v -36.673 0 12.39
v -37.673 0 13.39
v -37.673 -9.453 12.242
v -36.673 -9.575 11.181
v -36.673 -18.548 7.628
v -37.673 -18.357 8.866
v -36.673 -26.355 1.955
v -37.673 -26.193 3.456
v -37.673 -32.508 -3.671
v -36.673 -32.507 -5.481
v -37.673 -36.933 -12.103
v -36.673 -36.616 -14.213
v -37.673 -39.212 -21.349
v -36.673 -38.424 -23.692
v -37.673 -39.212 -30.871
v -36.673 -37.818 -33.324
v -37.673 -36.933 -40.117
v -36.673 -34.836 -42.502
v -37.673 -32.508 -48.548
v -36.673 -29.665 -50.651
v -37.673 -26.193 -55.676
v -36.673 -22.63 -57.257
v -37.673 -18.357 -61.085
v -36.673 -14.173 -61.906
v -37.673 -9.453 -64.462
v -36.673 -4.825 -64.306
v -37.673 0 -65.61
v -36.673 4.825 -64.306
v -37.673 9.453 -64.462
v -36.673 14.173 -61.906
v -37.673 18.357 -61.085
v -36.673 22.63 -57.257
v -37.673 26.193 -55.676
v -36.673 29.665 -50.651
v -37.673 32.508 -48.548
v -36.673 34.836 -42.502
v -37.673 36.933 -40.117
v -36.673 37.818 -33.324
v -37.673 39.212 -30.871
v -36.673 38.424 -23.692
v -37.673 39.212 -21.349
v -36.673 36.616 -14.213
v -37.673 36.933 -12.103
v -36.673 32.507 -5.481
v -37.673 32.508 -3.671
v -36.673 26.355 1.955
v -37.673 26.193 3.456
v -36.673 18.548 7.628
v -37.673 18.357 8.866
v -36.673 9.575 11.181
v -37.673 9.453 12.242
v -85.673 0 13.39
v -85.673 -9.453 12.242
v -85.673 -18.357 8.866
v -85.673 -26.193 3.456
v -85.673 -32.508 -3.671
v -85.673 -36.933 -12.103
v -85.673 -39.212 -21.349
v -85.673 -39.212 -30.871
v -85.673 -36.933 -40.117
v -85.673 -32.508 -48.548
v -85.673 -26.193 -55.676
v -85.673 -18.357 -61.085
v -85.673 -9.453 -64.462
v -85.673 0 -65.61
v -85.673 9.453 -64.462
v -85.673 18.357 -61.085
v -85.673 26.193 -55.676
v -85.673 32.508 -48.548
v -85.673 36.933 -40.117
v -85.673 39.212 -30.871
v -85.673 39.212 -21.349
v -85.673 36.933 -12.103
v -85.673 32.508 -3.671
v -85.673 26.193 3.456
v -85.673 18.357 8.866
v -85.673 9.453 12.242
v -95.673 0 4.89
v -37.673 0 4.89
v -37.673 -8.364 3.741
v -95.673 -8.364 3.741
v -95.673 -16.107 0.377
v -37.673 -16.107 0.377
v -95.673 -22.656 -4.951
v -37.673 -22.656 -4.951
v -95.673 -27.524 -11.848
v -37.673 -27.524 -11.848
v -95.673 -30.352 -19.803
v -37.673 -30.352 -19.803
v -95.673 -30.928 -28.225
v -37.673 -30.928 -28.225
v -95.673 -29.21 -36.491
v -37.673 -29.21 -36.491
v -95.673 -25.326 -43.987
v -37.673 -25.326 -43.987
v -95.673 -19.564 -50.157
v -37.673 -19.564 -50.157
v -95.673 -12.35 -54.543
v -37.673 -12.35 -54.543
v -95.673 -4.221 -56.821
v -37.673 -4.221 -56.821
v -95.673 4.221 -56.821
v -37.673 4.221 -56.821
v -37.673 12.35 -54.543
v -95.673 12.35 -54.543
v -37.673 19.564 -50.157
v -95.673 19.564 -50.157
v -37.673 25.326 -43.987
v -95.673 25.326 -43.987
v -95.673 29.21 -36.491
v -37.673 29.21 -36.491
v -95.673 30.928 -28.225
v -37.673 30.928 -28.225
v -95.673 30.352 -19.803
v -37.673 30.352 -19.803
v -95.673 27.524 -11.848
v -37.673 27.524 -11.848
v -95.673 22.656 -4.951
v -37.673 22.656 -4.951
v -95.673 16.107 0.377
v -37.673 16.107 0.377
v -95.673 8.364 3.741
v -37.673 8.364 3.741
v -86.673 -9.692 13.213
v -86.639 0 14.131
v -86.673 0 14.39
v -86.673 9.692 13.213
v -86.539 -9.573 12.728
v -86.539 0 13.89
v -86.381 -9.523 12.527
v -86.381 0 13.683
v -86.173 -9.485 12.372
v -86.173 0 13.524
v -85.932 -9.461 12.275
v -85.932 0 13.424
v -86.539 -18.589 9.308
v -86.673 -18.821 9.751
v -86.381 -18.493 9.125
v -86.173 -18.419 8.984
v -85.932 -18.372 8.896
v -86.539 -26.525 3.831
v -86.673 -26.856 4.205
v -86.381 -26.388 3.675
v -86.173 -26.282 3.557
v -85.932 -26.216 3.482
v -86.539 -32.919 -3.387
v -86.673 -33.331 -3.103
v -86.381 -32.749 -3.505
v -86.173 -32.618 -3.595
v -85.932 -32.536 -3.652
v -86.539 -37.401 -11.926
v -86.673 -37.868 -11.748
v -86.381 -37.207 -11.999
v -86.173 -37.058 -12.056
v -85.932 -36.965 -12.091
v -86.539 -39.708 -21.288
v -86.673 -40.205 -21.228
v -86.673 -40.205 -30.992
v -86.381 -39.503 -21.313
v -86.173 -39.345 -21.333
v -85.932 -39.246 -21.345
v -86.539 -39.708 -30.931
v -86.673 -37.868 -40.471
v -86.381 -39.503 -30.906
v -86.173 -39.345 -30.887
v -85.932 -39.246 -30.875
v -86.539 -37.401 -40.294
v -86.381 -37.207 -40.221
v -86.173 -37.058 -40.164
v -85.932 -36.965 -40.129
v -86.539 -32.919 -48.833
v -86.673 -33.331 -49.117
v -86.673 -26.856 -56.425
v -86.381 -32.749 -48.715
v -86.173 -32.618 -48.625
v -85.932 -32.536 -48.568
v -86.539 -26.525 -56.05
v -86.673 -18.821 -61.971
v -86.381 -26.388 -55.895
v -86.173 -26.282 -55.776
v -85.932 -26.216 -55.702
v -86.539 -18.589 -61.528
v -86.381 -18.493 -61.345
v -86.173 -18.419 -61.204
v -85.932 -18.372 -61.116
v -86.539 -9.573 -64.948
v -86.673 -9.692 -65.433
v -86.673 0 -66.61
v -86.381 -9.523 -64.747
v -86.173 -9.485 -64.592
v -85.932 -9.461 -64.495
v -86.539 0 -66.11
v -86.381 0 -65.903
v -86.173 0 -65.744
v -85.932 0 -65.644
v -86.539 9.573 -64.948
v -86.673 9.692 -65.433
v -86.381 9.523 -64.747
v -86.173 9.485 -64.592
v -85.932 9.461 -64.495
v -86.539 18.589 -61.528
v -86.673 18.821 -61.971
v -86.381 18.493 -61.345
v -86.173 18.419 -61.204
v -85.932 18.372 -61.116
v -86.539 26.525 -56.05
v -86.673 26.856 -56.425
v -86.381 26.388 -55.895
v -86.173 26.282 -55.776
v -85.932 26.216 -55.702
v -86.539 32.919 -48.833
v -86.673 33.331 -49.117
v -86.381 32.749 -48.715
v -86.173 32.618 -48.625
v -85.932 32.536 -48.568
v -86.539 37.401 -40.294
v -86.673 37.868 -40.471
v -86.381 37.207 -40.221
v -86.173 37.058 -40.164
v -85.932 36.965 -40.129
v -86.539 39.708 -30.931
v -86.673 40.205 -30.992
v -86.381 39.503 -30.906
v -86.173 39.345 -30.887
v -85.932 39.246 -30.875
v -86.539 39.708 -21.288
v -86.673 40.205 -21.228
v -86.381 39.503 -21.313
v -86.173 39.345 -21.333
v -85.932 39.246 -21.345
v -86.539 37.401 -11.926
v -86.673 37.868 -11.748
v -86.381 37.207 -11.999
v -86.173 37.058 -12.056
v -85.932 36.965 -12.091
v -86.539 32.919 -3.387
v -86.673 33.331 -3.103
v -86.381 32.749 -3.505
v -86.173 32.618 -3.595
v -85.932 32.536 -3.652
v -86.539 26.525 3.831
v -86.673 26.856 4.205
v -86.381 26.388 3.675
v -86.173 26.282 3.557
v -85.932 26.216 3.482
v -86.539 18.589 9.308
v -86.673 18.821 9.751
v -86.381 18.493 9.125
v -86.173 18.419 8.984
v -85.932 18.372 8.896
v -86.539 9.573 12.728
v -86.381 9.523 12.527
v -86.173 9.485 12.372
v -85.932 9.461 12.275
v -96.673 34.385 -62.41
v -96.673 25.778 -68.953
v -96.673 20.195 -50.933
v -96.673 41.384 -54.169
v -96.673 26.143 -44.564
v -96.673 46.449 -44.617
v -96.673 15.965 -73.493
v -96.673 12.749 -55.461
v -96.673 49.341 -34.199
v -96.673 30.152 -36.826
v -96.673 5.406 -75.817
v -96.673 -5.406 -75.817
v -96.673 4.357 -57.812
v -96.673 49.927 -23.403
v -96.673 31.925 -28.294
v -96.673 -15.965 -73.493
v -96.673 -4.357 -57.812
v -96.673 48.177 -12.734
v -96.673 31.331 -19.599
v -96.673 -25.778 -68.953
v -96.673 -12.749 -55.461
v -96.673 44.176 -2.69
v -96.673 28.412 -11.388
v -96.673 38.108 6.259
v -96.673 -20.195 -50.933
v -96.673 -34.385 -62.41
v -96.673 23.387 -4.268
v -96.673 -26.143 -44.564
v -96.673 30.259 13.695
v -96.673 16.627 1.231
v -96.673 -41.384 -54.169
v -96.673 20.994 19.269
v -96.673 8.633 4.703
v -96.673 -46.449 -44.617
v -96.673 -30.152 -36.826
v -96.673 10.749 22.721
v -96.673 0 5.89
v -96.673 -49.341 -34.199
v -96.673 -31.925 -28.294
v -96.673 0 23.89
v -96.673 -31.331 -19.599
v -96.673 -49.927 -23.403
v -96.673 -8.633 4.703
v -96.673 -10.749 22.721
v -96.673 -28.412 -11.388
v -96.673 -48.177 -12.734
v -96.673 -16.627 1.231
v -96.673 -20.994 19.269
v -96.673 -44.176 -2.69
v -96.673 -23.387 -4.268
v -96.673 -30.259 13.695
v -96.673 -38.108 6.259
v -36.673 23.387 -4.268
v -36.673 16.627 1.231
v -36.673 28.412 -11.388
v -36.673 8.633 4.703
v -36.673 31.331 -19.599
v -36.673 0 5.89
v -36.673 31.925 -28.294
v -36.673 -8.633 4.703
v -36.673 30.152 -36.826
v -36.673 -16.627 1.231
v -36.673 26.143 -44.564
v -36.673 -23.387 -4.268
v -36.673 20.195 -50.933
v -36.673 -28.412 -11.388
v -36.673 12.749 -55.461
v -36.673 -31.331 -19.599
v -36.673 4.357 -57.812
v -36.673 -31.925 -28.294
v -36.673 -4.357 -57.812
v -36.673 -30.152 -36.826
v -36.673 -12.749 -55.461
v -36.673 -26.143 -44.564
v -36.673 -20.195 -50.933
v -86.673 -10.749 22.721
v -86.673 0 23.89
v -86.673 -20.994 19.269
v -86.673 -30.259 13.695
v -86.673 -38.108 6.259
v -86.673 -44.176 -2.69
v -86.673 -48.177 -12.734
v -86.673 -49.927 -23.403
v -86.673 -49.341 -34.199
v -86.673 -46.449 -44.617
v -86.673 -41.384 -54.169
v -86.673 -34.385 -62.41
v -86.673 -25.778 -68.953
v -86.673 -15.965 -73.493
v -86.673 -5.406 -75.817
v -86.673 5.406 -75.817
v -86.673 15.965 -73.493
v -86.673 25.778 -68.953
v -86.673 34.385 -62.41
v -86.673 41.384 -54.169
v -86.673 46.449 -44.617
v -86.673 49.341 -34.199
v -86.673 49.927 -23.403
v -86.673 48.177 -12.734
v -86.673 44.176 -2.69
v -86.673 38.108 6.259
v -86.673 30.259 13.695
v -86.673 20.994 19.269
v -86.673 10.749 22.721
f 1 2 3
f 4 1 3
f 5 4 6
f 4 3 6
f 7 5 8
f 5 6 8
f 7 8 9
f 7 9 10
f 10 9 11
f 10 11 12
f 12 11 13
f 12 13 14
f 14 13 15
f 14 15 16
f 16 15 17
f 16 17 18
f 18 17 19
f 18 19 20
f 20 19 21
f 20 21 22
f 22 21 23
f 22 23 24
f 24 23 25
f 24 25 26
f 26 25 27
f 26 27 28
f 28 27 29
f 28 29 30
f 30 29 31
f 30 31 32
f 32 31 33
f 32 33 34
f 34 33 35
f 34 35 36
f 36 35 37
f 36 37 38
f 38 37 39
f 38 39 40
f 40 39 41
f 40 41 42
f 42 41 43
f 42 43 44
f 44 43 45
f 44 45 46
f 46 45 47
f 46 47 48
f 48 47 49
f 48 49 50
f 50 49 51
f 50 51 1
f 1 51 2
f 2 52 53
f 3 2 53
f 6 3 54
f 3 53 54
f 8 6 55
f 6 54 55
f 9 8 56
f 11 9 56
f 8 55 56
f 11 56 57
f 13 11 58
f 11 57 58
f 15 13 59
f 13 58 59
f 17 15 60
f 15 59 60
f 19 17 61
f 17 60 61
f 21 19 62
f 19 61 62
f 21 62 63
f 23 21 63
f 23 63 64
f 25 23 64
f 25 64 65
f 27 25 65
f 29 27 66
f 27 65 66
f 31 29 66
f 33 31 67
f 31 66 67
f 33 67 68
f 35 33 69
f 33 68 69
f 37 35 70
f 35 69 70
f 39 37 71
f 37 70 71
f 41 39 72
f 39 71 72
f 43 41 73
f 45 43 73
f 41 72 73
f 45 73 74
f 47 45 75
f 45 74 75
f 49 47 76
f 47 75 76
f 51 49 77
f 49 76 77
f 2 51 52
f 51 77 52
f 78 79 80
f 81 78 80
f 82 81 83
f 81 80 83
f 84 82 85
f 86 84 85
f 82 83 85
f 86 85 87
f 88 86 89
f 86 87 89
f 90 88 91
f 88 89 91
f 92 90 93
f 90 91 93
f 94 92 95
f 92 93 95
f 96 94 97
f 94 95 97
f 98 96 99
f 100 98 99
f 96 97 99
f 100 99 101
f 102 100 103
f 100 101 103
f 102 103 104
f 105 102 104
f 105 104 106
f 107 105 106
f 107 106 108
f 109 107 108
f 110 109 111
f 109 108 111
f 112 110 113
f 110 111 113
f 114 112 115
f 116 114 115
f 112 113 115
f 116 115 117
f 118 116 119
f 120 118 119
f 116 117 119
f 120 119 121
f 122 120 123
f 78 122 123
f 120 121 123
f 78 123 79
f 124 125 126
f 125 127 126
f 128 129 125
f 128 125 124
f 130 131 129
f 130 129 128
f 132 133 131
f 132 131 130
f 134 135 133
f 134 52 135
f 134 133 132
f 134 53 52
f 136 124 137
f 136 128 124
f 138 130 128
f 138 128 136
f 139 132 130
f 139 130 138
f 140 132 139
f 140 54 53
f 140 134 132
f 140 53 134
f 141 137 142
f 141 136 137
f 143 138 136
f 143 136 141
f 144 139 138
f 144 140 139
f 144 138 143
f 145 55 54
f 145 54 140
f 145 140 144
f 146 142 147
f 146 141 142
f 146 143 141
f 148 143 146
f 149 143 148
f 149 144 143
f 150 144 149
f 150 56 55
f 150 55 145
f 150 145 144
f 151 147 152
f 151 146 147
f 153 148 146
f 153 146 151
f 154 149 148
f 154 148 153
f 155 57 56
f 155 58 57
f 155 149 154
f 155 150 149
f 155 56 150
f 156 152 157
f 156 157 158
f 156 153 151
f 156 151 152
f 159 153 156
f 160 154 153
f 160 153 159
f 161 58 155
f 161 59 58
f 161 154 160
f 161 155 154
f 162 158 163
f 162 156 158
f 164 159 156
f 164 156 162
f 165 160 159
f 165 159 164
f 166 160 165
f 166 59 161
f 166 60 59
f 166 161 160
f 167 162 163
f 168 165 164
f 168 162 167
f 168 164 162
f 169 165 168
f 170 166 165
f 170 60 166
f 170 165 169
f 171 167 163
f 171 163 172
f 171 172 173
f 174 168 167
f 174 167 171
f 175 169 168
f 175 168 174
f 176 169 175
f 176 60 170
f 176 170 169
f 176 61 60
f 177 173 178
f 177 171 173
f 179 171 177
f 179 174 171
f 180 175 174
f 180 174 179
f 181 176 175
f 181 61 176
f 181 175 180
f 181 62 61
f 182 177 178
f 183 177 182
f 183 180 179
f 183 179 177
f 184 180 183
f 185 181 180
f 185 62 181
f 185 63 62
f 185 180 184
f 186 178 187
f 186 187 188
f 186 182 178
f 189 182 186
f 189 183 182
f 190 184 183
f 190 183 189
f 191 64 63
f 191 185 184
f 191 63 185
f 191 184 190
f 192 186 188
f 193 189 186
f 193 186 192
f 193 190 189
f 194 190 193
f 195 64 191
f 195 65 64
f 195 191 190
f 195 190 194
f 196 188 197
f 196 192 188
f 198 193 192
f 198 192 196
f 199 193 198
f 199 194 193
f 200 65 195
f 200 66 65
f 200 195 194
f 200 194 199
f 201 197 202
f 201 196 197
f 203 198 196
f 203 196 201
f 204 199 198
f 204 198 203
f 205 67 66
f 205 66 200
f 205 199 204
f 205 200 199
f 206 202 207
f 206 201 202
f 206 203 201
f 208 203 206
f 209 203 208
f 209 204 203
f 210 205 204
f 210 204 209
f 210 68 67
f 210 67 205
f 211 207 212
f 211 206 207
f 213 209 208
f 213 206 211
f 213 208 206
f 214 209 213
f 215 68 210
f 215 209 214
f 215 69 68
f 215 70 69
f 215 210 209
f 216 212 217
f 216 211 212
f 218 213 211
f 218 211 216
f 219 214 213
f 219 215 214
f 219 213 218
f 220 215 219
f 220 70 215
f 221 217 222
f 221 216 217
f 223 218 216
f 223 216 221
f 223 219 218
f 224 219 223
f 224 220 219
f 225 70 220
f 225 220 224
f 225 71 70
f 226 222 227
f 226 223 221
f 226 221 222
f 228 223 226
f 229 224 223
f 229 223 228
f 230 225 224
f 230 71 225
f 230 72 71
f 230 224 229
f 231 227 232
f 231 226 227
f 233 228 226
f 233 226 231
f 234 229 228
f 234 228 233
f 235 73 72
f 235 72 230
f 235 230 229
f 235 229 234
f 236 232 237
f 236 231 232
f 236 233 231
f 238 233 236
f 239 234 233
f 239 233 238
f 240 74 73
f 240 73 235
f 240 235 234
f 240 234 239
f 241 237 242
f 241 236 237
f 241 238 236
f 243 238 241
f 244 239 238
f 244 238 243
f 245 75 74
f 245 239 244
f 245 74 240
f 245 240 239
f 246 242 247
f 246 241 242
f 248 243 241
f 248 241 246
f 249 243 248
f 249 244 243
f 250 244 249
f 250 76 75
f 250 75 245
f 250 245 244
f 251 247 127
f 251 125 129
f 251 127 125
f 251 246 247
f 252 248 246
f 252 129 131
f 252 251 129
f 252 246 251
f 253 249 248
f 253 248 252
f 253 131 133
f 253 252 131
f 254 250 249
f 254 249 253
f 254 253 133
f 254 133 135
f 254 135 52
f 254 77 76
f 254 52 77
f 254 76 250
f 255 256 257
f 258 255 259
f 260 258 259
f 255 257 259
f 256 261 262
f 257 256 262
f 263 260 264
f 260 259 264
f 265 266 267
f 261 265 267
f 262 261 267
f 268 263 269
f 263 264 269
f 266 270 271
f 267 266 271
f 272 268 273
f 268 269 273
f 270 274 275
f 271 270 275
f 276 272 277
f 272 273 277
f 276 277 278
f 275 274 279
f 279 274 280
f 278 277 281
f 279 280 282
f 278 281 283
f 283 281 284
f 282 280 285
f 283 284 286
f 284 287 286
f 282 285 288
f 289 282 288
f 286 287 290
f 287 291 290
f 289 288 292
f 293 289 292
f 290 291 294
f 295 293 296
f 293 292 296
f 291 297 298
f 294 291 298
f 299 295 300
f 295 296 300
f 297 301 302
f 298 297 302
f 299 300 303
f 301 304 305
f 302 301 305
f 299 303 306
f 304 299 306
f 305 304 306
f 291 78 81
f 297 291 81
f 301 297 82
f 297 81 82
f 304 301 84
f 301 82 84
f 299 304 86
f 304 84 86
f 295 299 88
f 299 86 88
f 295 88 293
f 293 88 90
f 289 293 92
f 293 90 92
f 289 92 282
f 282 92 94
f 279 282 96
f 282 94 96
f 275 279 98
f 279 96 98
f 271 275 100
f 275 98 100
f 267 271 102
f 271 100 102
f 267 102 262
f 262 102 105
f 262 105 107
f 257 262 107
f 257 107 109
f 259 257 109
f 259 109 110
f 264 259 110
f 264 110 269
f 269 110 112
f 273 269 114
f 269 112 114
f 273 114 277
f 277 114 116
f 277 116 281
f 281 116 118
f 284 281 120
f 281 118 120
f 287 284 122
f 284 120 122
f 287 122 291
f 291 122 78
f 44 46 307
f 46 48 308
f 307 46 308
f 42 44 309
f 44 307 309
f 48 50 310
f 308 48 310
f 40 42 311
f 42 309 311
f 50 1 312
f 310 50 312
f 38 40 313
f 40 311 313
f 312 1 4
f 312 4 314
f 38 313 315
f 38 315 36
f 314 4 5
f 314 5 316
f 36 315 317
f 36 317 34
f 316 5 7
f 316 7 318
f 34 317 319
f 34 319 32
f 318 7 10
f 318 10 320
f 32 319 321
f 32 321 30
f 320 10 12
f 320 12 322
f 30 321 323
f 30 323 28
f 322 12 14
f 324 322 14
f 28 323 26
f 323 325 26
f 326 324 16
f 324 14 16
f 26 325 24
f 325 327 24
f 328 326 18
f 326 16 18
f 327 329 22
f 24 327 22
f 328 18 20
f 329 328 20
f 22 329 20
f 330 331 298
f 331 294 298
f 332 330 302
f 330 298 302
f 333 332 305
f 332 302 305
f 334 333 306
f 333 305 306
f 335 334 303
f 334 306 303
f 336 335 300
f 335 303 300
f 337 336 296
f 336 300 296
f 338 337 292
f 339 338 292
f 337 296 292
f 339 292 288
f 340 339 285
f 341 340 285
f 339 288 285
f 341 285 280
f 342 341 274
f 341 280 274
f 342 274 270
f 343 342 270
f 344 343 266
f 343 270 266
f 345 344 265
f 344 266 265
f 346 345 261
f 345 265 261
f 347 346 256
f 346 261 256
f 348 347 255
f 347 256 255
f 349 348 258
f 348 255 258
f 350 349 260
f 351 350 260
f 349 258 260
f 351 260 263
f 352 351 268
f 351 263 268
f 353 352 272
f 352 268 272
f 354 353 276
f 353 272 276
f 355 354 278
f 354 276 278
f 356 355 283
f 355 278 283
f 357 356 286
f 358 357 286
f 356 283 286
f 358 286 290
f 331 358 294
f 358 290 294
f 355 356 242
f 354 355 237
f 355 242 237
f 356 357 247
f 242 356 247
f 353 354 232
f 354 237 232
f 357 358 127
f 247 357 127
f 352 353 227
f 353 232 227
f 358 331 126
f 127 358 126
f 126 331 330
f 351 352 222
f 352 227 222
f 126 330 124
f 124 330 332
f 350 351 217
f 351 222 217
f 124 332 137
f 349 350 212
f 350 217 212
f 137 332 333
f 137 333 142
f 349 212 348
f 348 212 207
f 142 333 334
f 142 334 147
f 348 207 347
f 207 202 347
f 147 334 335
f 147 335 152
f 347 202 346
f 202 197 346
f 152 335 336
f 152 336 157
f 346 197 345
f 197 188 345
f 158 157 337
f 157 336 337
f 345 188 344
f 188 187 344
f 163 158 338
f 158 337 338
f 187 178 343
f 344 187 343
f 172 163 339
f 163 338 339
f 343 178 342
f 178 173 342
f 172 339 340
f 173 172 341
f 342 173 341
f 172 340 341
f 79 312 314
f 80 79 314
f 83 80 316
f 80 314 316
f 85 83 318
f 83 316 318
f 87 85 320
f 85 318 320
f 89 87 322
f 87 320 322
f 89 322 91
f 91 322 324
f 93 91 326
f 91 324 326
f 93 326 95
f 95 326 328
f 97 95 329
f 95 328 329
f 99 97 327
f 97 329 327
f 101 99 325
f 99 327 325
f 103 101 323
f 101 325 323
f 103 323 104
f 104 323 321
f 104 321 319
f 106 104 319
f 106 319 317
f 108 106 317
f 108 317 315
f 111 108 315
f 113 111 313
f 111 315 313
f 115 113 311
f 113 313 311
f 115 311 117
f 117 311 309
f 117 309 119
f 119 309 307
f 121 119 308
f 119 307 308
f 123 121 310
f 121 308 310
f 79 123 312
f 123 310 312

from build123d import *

# Parameters (mm, degrees)
F2_SIZE = 1
F3_R    = 1


with BuildPart() as f1:
    # F0 (on Front) → F1 (revolve)
    with BuildSketch(Plane.XZ):
        Polygon((-96.6734094576, 23.8900707406), (-96.6734094576, 4.8900707406), (-36.6734094576, 4.8900707406), (-36.6734094576, 13.3900707406), (-86.6734094576, 13.3900707406), (-86.6734094576, 23.8900707406), align=None)
    revolve(axis=Axis((-29.0751103312, 0, -26.1099292594), (1, 0, 0)))

    # F2
    f2_edges = [f1.edges().sort_by_distance(p)[0] for p in [
        (-36.673409, 0, -57.109929),
        (-36.673409, 0, -65.609929),
        (-96.673409, 0, -57.109929),
    ]]
    chamfer(f2_edges, length=F2_SIZE)

    # F3
    f3_edges = [f1.edges().sort_by_distance(p)[0] for p in [
        (-86.673409, 0, -65.609929),
    ]]
    fillet(f3_edges, radius=F3_R)


solid = f1.part
